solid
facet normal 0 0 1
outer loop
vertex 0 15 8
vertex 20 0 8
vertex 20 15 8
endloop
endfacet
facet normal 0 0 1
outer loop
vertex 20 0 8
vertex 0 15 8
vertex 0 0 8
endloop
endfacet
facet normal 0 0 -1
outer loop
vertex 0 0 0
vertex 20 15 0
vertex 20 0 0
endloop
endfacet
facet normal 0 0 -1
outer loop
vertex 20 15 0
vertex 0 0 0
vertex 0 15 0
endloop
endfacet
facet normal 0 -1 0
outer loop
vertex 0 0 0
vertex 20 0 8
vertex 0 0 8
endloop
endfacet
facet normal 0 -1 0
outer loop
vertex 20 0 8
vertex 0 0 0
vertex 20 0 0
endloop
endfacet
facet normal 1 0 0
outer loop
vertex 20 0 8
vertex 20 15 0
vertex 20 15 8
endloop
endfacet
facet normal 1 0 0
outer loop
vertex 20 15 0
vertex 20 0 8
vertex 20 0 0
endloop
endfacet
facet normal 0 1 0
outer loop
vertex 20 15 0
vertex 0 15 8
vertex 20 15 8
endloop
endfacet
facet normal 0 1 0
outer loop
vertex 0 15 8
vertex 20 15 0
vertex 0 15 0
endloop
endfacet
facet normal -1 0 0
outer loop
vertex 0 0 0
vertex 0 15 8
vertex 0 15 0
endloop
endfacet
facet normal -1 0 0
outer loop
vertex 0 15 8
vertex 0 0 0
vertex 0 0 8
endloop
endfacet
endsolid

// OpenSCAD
function total(n,acc=0)=n<=0?acc:total(n-1,acc+sin(n)*sin(n)+cos(n)*cos(n));
v=total(20000); assert(abs(v-20000)<0.001);
cube([v/1000,15,8]);
